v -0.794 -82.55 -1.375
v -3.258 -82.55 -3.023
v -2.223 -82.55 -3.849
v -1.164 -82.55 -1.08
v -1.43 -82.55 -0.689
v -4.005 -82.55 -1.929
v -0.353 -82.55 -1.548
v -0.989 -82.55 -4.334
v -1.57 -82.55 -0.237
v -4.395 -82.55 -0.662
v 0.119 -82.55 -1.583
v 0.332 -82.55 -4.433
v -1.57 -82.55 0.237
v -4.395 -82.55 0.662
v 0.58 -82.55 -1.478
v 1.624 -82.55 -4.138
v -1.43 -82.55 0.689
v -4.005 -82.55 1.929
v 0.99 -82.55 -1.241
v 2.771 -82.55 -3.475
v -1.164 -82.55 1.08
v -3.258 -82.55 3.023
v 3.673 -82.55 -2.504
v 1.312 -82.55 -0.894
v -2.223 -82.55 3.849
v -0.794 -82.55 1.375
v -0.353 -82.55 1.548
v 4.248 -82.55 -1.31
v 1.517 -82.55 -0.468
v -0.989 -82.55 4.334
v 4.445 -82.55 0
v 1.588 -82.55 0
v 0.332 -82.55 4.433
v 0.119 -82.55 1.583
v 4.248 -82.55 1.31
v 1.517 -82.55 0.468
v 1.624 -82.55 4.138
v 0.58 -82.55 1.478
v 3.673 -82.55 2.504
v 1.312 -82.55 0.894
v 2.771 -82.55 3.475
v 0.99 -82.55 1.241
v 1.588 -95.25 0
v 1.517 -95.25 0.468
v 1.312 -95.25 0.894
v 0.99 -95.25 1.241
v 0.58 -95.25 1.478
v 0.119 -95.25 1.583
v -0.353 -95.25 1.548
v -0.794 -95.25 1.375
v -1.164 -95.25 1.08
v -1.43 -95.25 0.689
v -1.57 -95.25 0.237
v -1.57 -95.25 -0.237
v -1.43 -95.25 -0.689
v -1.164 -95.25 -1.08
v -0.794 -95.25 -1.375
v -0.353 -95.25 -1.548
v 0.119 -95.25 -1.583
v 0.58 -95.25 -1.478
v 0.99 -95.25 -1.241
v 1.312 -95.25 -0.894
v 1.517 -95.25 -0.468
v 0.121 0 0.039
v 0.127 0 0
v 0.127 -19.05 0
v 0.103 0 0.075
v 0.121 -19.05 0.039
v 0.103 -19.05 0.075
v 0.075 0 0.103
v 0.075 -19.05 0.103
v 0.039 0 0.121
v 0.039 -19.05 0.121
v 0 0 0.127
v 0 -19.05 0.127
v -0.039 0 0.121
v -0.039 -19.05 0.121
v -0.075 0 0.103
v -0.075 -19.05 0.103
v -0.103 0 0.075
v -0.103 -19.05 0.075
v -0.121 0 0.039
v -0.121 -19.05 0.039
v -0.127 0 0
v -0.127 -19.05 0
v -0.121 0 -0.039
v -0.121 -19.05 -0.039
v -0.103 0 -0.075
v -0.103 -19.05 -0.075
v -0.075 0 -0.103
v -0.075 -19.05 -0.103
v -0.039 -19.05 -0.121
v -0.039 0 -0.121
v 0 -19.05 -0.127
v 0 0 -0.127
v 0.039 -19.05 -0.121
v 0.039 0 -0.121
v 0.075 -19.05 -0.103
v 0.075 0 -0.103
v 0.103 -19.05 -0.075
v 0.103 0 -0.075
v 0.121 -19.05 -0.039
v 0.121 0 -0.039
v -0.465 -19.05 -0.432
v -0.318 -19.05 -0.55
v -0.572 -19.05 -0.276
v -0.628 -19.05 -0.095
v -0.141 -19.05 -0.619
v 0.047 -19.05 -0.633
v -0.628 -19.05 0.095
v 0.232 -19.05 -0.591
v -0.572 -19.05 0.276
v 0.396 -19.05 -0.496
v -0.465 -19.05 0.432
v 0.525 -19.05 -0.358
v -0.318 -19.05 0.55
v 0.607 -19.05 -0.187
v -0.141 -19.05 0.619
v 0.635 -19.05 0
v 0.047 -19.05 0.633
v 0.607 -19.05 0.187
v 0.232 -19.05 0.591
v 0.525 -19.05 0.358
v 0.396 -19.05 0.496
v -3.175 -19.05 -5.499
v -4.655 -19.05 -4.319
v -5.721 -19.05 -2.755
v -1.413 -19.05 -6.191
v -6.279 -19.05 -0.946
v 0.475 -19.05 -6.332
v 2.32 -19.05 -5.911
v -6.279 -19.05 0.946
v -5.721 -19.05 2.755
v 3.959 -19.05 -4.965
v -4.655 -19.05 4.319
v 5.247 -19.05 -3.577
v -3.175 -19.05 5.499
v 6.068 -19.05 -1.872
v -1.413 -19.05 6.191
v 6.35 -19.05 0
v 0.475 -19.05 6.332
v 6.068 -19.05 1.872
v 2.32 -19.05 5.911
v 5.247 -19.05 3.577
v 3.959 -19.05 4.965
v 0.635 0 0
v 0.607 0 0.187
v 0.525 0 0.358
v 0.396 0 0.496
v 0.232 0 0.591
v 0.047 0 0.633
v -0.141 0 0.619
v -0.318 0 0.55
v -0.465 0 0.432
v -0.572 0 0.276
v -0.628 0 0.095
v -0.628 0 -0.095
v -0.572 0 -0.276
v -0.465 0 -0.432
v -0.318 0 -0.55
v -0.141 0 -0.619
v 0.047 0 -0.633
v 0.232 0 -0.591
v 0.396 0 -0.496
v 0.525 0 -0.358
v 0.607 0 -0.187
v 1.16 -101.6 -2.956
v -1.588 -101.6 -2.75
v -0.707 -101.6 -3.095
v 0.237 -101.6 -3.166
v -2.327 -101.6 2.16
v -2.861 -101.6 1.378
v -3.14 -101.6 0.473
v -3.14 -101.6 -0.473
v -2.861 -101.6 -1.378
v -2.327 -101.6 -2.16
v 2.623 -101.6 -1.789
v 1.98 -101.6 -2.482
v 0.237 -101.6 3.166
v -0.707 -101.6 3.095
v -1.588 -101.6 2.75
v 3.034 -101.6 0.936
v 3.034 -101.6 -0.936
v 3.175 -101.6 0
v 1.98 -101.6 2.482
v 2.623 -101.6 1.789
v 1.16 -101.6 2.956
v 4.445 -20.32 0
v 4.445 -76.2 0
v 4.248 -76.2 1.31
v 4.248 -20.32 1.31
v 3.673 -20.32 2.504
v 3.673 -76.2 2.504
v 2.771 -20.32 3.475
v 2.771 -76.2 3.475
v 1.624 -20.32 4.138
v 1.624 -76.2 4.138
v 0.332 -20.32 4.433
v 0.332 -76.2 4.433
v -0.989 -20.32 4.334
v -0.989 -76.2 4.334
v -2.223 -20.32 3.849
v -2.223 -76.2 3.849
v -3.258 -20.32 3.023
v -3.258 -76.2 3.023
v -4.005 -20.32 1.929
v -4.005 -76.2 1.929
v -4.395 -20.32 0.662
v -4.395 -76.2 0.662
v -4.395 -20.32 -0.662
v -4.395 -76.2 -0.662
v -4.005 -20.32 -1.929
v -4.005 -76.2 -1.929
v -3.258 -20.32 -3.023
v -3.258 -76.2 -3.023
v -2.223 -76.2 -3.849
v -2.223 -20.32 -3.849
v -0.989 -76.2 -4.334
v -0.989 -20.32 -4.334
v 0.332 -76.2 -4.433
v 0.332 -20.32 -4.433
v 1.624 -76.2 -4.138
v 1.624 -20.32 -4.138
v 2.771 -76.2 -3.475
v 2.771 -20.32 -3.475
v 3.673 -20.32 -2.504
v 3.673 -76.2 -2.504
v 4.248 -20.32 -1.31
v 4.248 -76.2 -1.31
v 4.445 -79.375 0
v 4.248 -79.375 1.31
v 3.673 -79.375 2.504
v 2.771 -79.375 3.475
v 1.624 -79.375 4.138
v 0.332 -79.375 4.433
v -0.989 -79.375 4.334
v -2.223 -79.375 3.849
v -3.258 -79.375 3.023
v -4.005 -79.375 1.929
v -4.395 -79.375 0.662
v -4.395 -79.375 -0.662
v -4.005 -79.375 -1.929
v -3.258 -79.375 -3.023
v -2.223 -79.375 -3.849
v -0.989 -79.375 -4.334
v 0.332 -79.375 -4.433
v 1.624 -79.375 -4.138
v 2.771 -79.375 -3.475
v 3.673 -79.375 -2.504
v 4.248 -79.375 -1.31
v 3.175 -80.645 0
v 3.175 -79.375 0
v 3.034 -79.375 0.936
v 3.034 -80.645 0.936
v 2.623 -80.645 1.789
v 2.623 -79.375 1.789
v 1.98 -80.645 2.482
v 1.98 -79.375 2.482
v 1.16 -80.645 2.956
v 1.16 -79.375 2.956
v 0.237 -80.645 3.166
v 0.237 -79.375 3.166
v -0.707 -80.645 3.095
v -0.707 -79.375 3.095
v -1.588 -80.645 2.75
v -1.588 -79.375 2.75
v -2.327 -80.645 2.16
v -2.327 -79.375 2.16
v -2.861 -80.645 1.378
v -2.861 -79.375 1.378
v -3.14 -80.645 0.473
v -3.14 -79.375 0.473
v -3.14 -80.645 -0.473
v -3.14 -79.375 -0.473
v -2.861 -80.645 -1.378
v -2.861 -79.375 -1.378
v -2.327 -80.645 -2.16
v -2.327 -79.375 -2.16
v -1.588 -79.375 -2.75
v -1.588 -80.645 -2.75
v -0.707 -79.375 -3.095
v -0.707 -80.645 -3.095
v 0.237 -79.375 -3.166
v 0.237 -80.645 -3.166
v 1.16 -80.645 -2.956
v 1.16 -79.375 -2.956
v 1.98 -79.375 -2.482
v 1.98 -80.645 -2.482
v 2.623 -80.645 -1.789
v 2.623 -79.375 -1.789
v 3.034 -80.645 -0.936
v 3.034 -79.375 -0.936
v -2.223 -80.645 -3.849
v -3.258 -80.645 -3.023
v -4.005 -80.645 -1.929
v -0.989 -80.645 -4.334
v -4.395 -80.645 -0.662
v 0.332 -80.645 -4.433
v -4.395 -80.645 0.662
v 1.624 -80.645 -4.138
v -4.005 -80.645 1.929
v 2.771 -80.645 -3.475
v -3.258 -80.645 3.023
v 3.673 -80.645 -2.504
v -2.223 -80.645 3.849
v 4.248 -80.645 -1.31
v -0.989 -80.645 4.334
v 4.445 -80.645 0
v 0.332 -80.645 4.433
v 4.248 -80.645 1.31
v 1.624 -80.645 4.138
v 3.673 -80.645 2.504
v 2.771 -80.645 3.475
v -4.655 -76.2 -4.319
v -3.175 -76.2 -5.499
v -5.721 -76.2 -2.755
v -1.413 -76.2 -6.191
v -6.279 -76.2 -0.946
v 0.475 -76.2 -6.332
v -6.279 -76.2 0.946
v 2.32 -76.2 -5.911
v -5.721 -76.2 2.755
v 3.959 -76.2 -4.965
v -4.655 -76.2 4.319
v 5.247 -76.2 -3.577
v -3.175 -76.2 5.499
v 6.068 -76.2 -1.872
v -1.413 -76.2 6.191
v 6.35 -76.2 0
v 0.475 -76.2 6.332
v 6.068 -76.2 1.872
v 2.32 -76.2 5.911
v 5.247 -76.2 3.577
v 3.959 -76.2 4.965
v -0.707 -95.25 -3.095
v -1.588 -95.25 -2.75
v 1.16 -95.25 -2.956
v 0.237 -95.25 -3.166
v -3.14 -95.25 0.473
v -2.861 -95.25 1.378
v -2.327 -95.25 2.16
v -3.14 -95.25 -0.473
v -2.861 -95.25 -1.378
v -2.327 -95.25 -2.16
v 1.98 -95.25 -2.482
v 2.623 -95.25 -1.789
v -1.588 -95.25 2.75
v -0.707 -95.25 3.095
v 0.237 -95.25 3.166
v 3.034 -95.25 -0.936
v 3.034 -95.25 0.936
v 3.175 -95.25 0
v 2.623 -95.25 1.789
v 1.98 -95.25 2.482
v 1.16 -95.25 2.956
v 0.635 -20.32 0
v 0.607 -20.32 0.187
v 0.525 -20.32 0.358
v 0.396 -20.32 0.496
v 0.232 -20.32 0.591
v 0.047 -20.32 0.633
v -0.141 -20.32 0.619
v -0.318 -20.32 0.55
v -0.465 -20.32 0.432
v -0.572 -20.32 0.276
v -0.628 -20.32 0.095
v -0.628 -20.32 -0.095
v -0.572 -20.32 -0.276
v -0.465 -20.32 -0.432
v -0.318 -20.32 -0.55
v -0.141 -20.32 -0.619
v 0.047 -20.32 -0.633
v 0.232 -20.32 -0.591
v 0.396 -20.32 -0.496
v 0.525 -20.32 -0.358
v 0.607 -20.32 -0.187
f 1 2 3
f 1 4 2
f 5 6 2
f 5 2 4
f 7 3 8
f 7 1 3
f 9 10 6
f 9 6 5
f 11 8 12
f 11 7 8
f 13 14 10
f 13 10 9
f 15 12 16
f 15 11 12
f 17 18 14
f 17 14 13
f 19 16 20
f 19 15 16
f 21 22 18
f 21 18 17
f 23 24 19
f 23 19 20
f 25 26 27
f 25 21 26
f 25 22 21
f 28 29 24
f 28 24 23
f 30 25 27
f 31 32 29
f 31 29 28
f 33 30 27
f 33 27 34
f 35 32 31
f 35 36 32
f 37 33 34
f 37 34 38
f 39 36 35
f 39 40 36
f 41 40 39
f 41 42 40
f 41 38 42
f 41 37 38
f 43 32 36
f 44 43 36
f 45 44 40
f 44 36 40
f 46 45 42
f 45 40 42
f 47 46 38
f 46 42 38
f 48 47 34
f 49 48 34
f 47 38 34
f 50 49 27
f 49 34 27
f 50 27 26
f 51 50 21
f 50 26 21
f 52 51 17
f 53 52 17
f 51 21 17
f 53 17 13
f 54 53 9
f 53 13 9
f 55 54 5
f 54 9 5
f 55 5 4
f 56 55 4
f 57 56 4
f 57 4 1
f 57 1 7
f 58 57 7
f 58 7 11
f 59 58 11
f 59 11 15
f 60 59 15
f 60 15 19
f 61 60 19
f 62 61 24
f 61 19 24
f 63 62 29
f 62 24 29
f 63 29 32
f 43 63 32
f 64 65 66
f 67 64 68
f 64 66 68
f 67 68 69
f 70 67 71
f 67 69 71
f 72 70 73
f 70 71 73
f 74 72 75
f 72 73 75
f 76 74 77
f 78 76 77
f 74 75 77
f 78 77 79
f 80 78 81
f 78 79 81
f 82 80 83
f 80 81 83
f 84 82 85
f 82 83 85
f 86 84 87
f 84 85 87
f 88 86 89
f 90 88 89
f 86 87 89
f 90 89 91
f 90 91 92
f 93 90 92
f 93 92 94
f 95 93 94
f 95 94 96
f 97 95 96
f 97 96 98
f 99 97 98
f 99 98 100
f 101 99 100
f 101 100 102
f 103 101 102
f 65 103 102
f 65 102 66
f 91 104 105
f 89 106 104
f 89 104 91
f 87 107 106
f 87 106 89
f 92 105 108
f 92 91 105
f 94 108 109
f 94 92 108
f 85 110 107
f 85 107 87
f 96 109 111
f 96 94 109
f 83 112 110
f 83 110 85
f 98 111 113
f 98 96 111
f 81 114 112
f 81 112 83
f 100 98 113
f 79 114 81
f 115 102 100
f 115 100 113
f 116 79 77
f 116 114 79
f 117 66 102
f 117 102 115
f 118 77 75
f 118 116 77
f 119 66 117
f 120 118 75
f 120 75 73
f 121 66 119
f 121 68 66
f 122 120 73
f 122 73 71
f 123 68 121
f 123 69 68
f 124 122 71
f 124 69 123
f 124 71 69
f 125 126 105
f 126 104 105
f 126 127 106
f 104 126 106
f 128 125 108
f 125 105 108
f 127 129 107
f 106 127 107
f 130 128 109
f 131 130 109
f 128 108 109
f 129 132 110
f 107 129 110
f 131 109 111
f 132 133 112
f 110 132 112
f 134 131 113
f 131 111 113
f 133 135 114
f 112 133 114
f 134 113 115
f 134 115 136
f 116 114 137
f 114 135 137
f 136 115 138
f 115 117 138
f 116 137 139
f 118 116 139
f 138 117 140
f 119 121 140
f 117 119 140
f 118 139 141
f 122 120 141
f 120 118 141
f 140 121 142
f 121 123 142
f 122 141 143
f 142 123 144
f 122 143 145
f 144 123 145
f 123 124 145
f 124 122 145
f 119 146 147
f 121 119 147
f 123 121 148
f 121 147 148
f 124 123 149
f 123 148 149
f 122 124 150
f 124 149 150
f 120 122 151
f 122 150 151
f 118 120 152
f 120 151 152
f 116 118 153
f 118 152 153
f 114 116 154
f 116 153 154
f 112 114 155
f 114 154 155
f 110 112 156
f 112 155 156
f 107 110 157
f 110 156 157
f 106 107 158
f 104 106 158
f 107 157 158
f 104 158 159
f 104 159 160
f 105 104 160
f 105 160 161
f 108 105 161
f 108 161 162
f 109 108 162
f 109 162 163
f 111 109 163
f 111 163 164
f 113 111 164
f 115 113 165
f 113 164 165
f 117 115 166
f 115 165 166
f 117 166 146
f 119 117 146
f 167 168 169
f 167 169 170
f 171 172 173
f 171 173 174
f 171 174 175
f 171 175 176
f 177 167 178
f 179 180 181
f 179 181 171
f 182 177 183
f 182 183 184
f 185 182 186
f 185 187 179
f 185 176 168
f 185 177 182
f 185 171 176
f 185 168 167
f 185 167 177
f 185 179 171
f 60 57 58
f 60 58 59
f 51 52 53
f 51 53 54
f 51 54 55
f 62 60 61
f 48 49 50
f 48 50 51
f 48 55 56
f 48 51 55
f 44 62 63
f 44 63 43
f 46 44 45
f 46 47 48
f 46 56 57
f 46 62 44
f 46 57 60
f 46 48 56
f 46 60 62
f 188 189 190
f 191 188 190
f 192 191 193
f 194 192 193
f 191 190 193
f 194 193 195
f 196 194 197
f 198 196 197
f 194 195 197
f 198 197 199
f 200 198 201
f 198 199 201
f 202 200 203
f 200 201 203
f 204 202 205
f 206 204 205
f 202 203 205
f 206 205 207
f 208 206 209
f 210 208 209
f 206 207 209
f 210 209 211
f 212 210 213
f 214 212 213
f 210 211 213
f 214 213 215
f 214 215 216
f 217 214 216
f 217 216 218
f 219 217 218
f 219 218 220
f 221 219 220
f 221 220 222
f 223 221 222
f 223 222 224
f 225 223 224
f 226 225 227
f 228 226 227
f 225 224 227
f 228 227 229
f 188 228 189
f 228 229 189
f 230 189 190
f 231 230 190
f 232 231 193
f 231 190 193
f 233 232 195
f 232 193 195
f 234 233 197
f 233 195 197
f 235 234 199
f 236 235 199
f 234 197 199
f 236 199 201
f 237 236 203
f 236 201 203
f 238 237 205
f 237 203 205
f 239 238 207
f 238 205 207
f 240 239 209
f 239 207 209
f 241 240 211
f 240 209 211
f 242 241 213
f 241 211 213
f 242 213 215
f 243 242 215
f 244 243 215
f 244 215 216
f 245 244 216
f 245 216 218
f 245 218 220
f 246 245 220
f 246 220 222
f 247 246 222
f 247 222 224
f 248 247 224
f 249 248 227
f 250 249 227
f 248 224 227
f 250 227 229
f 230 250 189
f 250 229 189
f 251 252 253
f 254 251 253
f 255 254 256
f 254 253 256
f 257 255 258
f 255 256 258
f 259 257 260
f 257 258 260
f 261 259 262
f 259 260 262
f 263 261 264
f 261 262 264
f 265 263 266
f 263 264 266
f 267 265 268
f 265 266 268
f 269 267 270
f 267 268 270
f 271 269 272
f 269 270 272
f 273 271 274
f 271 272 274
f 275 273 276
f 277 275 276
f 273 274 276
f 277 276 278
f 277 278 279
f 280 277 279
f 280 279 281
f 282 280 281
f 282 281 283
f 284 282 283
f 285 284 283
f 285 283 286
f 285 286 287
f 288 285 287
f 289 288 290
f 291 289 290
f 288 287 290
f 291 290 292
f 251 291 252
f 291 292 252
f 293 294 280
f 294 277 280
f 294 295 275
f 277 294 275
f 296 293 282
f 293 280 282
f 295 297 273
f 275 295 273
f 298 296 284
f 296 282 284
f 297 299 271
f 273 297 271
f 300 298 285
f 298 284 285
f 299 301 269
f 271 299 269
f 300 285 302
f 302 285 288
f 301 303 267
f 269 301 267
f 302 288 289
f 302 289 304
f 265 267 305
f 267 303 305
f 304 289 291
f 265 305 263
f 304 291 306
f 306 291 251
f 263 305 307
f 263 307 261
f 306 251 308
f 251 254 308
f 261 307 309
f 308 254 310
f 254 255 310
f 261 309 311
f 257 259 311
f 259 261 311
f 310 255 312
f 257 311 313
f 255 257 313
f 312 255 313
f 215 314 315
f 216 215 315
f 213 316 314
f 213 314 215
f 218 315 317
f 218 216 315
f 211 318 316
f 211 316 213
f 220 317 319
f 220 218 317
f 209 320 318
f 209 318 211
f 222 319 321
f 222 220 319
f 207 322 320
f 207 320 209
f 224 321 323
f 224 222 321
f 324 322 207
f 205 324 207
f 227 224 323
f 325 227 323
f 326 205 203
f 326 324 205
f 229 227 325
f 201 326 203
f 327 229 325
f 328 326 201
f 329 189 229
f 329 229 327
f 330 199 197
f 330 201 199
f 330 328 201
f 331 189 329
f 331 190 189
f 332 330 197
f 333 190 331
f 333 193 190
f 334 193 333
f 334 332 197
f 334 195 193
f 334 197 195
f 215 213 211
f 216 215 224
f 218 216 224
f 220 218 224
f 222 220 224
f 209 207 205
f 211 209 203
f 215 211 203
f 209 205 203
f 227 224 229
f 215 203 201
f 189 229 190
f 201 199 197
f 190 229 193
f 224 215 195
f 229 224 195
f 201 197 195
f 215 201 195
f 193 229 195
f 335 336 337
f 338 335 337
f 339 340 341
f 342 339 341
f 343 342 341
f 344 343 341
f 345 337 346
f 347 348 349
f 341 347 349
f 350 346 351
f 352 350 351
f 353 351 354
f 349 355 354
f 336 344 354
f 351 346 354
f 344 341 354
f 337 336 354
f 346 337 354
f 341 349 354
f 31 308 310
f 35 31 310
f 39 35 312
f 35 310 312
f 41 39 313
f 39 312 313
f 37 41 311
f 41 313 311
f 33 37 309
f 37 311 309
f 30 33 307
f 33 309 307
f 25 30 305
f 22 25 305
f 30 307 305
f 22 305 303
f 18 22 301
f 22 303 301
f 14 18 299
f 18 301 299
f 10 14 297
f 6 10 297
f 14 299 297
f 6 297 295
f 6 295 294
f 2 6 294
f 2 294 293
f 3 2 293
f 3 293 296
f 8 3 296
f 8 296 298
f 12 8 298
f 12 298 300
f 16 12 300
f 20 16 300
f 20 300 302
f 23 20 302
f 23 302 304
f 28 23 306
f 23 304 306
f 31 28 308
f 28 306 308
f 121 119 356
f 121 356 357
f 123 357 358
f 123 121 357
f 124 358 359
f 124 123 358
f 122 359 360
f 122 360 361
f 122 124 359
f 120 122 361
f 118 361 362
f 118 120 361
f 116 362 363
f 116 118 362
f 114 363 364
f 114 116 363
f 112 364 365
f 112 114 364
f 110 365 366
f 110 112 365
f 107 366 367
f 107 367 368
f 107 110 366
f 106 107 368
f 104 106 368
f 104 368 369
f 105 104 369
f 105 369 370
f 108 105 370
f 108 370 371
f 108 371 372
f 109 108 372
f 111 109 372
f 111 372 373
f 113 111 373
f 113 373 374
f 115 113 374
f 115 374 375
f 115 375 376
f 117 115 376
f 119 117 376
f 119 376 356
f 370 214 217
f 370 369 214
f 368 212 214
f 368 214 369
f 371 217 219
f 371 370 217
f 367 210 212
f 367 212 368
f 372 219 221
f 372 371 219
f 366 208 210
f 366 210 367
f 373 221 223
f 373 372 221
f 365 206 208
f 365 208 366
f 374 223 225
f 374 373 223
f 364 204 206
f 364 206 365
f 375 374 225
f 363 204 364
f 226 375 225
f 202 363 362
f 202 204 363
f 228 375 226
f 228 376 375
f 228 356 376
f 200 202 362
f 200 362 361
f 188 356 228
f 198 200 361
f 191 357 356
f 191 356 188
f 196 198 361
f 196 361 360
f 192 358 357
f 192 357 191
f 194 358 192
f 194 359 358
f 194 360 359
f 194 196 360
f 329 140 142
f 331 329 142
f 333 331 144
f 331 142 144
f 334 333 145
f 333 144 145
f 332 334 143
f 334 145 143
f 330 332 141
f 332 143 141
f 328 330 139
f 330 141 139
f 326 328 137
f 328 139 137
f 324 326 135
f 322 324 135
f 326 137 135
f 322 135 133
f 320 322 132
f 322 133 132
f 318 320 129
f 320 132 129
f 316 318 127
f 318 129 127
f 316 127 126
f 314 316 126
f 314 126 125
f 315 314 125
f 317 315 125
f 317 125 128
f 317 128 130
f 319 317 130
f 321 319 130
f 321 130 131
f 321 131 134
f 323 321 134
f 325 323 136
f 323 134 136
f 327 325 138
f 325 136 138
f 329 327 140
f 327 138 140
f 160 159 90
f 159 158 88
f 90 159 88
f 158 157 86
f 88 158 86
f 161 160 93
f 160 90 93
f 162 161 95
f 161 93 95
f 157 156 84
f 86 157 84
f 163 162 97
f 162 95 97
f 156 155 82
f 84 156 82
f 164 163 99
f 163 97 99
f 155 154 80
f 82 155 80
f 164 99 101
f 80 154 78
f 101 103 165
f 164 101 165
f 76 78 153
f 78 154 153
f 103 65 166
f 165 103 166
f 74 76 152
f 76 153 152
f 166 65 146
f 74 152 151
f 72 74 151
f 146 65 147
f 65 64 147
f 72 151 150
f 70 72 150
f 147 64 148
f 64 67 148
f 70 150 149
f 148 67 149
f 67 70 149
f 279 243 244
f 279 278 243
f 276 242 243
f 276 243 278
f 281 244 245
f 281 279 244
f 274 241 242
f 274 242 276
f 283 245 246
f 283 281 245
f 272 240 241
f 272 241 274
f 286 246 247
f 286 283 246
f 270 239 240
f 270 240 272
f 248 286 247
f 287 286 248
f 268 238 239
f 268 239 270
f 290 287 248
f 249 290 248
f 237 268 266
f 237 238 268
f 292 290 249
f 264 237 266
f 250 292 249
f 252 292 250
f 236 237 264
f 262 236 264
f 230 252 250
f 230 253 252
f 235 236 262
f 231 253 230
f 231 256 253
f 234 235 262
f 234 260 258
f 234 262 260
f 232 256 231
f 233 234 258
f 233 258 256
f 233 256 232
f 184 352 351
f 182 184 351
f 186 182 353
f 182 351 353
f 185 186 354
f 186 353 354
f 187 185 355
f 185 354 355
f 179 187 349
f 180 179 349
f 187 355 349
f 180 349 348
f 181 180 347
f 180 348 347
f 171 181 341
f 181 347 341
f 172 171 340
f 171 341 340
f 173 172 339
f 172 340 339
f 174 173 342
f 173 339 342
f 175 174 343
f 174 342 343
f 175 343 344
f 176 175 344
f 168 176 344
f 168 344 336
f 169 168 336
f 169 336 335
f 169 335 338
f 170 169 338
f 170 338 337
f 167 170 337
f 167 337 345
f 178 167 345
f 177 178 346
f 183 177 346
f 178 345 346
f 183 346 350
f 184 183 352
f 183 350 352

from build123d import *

# Parameters (mm, degrees)
F0_R      = 0.635
F1_DEPTH  = 19.05
F2_R      = 0.127
F3_DEPTH  = 25.4
F4_R      = 6.35
F4_R_2    = 0.635
F5_DEPTH  = 57.15
F6_R      = 4.445
F6_R_2    = 0.635
F7_DEPTH  = 55.88
F8_R      = 4.445
F9_DEPTH  = 3.175
F10_R     = 3.175
F11_DEPTH = 1.27
F12_R     = 4.445
F12_R_2   = 3.175
F13_DEPTH = 1.905
F14_R     = 1.5875
F15_DEPTH = 12.7
F16_R     = 3.175
F16_R_2   = 1.5875
F17_DEPTH = 6.35


with BuildPart() as f1:
    # F0 (on Front) → F1 (new body)
    with BuildSketch(Plane.XZ):
        Circle(F0_R)
    extrude(amount=F1_DEPTH)

    # F2 (on face) → F3 (cut)
    with BuildSketch(Plane.XZ.offset(19.05)):
        Circle(F2_R)
    extrude(amount=-F3_DEPTH, mode=Mode.SUBTRACT)


with BuildPart() as f5:
    # F4 (on face) → F5 (new body)
    with BuildSketch(Plane.XZ.offset(19.05)):
        Circle(F4_R)
        Circle(F4_R_2, mode=Mode.SUBTRACT)
    extrude(amount=F5_DEPTH)

    # F6 (on face) → F7 (cut)
    with BuildSketch(Plane.XZ.offset(76.2)):
        Circle(F6_R)
        Circle(F6_R_2, mode=Mode.SUBTRACT)
    extrude(amount=-F7_DEPTH, mode=Mode.SUBTRACT)


with BuildPart() as f9:
    # F8 (on face) → F9 (new body)
    with BuildSketch(Plane.XZ.offset(76.2)):
        Circle(F8_R)
    extrude(amount=F9_DEPTH)

    # F10 (on face) → F11 (join)
    with BuildSketch(Plane.XZ.offset(79.375)):
        Circle(F10_R)
    extrude(amount=F11_DEPTH)

    # F12 (on face) → F13 (join)
    with BuildSketch(Plane.XZ.offset(80.645)):
        Circle(F12_R)
        Circle(F12_R_2, mode=Mode.SUBTRACT)
        Circle(F12_R_2)
    extrude(amount=F13_DEPTH)

    # F14 (on face) → F15 (join)
    with BuildSketch(Plane.XZ.offset(82.55)):
        Circle(F14_R)
    extrude(amount=F15_DEPTH)


with BuildPart() as f17:
    # F16 (on face) → F17 (new body)
    with BuildSketch(Plane.XZ.offset(95.25)):
        Circle(F16_R)
        Circle(F16_R_2, mode=Mode.SUBTRACT)
        Circle(F16_R_2)
    extrude(amount=F17_DEPTH)


solid = Compound([f1.part, f5.part, f9.part, f17.part])
